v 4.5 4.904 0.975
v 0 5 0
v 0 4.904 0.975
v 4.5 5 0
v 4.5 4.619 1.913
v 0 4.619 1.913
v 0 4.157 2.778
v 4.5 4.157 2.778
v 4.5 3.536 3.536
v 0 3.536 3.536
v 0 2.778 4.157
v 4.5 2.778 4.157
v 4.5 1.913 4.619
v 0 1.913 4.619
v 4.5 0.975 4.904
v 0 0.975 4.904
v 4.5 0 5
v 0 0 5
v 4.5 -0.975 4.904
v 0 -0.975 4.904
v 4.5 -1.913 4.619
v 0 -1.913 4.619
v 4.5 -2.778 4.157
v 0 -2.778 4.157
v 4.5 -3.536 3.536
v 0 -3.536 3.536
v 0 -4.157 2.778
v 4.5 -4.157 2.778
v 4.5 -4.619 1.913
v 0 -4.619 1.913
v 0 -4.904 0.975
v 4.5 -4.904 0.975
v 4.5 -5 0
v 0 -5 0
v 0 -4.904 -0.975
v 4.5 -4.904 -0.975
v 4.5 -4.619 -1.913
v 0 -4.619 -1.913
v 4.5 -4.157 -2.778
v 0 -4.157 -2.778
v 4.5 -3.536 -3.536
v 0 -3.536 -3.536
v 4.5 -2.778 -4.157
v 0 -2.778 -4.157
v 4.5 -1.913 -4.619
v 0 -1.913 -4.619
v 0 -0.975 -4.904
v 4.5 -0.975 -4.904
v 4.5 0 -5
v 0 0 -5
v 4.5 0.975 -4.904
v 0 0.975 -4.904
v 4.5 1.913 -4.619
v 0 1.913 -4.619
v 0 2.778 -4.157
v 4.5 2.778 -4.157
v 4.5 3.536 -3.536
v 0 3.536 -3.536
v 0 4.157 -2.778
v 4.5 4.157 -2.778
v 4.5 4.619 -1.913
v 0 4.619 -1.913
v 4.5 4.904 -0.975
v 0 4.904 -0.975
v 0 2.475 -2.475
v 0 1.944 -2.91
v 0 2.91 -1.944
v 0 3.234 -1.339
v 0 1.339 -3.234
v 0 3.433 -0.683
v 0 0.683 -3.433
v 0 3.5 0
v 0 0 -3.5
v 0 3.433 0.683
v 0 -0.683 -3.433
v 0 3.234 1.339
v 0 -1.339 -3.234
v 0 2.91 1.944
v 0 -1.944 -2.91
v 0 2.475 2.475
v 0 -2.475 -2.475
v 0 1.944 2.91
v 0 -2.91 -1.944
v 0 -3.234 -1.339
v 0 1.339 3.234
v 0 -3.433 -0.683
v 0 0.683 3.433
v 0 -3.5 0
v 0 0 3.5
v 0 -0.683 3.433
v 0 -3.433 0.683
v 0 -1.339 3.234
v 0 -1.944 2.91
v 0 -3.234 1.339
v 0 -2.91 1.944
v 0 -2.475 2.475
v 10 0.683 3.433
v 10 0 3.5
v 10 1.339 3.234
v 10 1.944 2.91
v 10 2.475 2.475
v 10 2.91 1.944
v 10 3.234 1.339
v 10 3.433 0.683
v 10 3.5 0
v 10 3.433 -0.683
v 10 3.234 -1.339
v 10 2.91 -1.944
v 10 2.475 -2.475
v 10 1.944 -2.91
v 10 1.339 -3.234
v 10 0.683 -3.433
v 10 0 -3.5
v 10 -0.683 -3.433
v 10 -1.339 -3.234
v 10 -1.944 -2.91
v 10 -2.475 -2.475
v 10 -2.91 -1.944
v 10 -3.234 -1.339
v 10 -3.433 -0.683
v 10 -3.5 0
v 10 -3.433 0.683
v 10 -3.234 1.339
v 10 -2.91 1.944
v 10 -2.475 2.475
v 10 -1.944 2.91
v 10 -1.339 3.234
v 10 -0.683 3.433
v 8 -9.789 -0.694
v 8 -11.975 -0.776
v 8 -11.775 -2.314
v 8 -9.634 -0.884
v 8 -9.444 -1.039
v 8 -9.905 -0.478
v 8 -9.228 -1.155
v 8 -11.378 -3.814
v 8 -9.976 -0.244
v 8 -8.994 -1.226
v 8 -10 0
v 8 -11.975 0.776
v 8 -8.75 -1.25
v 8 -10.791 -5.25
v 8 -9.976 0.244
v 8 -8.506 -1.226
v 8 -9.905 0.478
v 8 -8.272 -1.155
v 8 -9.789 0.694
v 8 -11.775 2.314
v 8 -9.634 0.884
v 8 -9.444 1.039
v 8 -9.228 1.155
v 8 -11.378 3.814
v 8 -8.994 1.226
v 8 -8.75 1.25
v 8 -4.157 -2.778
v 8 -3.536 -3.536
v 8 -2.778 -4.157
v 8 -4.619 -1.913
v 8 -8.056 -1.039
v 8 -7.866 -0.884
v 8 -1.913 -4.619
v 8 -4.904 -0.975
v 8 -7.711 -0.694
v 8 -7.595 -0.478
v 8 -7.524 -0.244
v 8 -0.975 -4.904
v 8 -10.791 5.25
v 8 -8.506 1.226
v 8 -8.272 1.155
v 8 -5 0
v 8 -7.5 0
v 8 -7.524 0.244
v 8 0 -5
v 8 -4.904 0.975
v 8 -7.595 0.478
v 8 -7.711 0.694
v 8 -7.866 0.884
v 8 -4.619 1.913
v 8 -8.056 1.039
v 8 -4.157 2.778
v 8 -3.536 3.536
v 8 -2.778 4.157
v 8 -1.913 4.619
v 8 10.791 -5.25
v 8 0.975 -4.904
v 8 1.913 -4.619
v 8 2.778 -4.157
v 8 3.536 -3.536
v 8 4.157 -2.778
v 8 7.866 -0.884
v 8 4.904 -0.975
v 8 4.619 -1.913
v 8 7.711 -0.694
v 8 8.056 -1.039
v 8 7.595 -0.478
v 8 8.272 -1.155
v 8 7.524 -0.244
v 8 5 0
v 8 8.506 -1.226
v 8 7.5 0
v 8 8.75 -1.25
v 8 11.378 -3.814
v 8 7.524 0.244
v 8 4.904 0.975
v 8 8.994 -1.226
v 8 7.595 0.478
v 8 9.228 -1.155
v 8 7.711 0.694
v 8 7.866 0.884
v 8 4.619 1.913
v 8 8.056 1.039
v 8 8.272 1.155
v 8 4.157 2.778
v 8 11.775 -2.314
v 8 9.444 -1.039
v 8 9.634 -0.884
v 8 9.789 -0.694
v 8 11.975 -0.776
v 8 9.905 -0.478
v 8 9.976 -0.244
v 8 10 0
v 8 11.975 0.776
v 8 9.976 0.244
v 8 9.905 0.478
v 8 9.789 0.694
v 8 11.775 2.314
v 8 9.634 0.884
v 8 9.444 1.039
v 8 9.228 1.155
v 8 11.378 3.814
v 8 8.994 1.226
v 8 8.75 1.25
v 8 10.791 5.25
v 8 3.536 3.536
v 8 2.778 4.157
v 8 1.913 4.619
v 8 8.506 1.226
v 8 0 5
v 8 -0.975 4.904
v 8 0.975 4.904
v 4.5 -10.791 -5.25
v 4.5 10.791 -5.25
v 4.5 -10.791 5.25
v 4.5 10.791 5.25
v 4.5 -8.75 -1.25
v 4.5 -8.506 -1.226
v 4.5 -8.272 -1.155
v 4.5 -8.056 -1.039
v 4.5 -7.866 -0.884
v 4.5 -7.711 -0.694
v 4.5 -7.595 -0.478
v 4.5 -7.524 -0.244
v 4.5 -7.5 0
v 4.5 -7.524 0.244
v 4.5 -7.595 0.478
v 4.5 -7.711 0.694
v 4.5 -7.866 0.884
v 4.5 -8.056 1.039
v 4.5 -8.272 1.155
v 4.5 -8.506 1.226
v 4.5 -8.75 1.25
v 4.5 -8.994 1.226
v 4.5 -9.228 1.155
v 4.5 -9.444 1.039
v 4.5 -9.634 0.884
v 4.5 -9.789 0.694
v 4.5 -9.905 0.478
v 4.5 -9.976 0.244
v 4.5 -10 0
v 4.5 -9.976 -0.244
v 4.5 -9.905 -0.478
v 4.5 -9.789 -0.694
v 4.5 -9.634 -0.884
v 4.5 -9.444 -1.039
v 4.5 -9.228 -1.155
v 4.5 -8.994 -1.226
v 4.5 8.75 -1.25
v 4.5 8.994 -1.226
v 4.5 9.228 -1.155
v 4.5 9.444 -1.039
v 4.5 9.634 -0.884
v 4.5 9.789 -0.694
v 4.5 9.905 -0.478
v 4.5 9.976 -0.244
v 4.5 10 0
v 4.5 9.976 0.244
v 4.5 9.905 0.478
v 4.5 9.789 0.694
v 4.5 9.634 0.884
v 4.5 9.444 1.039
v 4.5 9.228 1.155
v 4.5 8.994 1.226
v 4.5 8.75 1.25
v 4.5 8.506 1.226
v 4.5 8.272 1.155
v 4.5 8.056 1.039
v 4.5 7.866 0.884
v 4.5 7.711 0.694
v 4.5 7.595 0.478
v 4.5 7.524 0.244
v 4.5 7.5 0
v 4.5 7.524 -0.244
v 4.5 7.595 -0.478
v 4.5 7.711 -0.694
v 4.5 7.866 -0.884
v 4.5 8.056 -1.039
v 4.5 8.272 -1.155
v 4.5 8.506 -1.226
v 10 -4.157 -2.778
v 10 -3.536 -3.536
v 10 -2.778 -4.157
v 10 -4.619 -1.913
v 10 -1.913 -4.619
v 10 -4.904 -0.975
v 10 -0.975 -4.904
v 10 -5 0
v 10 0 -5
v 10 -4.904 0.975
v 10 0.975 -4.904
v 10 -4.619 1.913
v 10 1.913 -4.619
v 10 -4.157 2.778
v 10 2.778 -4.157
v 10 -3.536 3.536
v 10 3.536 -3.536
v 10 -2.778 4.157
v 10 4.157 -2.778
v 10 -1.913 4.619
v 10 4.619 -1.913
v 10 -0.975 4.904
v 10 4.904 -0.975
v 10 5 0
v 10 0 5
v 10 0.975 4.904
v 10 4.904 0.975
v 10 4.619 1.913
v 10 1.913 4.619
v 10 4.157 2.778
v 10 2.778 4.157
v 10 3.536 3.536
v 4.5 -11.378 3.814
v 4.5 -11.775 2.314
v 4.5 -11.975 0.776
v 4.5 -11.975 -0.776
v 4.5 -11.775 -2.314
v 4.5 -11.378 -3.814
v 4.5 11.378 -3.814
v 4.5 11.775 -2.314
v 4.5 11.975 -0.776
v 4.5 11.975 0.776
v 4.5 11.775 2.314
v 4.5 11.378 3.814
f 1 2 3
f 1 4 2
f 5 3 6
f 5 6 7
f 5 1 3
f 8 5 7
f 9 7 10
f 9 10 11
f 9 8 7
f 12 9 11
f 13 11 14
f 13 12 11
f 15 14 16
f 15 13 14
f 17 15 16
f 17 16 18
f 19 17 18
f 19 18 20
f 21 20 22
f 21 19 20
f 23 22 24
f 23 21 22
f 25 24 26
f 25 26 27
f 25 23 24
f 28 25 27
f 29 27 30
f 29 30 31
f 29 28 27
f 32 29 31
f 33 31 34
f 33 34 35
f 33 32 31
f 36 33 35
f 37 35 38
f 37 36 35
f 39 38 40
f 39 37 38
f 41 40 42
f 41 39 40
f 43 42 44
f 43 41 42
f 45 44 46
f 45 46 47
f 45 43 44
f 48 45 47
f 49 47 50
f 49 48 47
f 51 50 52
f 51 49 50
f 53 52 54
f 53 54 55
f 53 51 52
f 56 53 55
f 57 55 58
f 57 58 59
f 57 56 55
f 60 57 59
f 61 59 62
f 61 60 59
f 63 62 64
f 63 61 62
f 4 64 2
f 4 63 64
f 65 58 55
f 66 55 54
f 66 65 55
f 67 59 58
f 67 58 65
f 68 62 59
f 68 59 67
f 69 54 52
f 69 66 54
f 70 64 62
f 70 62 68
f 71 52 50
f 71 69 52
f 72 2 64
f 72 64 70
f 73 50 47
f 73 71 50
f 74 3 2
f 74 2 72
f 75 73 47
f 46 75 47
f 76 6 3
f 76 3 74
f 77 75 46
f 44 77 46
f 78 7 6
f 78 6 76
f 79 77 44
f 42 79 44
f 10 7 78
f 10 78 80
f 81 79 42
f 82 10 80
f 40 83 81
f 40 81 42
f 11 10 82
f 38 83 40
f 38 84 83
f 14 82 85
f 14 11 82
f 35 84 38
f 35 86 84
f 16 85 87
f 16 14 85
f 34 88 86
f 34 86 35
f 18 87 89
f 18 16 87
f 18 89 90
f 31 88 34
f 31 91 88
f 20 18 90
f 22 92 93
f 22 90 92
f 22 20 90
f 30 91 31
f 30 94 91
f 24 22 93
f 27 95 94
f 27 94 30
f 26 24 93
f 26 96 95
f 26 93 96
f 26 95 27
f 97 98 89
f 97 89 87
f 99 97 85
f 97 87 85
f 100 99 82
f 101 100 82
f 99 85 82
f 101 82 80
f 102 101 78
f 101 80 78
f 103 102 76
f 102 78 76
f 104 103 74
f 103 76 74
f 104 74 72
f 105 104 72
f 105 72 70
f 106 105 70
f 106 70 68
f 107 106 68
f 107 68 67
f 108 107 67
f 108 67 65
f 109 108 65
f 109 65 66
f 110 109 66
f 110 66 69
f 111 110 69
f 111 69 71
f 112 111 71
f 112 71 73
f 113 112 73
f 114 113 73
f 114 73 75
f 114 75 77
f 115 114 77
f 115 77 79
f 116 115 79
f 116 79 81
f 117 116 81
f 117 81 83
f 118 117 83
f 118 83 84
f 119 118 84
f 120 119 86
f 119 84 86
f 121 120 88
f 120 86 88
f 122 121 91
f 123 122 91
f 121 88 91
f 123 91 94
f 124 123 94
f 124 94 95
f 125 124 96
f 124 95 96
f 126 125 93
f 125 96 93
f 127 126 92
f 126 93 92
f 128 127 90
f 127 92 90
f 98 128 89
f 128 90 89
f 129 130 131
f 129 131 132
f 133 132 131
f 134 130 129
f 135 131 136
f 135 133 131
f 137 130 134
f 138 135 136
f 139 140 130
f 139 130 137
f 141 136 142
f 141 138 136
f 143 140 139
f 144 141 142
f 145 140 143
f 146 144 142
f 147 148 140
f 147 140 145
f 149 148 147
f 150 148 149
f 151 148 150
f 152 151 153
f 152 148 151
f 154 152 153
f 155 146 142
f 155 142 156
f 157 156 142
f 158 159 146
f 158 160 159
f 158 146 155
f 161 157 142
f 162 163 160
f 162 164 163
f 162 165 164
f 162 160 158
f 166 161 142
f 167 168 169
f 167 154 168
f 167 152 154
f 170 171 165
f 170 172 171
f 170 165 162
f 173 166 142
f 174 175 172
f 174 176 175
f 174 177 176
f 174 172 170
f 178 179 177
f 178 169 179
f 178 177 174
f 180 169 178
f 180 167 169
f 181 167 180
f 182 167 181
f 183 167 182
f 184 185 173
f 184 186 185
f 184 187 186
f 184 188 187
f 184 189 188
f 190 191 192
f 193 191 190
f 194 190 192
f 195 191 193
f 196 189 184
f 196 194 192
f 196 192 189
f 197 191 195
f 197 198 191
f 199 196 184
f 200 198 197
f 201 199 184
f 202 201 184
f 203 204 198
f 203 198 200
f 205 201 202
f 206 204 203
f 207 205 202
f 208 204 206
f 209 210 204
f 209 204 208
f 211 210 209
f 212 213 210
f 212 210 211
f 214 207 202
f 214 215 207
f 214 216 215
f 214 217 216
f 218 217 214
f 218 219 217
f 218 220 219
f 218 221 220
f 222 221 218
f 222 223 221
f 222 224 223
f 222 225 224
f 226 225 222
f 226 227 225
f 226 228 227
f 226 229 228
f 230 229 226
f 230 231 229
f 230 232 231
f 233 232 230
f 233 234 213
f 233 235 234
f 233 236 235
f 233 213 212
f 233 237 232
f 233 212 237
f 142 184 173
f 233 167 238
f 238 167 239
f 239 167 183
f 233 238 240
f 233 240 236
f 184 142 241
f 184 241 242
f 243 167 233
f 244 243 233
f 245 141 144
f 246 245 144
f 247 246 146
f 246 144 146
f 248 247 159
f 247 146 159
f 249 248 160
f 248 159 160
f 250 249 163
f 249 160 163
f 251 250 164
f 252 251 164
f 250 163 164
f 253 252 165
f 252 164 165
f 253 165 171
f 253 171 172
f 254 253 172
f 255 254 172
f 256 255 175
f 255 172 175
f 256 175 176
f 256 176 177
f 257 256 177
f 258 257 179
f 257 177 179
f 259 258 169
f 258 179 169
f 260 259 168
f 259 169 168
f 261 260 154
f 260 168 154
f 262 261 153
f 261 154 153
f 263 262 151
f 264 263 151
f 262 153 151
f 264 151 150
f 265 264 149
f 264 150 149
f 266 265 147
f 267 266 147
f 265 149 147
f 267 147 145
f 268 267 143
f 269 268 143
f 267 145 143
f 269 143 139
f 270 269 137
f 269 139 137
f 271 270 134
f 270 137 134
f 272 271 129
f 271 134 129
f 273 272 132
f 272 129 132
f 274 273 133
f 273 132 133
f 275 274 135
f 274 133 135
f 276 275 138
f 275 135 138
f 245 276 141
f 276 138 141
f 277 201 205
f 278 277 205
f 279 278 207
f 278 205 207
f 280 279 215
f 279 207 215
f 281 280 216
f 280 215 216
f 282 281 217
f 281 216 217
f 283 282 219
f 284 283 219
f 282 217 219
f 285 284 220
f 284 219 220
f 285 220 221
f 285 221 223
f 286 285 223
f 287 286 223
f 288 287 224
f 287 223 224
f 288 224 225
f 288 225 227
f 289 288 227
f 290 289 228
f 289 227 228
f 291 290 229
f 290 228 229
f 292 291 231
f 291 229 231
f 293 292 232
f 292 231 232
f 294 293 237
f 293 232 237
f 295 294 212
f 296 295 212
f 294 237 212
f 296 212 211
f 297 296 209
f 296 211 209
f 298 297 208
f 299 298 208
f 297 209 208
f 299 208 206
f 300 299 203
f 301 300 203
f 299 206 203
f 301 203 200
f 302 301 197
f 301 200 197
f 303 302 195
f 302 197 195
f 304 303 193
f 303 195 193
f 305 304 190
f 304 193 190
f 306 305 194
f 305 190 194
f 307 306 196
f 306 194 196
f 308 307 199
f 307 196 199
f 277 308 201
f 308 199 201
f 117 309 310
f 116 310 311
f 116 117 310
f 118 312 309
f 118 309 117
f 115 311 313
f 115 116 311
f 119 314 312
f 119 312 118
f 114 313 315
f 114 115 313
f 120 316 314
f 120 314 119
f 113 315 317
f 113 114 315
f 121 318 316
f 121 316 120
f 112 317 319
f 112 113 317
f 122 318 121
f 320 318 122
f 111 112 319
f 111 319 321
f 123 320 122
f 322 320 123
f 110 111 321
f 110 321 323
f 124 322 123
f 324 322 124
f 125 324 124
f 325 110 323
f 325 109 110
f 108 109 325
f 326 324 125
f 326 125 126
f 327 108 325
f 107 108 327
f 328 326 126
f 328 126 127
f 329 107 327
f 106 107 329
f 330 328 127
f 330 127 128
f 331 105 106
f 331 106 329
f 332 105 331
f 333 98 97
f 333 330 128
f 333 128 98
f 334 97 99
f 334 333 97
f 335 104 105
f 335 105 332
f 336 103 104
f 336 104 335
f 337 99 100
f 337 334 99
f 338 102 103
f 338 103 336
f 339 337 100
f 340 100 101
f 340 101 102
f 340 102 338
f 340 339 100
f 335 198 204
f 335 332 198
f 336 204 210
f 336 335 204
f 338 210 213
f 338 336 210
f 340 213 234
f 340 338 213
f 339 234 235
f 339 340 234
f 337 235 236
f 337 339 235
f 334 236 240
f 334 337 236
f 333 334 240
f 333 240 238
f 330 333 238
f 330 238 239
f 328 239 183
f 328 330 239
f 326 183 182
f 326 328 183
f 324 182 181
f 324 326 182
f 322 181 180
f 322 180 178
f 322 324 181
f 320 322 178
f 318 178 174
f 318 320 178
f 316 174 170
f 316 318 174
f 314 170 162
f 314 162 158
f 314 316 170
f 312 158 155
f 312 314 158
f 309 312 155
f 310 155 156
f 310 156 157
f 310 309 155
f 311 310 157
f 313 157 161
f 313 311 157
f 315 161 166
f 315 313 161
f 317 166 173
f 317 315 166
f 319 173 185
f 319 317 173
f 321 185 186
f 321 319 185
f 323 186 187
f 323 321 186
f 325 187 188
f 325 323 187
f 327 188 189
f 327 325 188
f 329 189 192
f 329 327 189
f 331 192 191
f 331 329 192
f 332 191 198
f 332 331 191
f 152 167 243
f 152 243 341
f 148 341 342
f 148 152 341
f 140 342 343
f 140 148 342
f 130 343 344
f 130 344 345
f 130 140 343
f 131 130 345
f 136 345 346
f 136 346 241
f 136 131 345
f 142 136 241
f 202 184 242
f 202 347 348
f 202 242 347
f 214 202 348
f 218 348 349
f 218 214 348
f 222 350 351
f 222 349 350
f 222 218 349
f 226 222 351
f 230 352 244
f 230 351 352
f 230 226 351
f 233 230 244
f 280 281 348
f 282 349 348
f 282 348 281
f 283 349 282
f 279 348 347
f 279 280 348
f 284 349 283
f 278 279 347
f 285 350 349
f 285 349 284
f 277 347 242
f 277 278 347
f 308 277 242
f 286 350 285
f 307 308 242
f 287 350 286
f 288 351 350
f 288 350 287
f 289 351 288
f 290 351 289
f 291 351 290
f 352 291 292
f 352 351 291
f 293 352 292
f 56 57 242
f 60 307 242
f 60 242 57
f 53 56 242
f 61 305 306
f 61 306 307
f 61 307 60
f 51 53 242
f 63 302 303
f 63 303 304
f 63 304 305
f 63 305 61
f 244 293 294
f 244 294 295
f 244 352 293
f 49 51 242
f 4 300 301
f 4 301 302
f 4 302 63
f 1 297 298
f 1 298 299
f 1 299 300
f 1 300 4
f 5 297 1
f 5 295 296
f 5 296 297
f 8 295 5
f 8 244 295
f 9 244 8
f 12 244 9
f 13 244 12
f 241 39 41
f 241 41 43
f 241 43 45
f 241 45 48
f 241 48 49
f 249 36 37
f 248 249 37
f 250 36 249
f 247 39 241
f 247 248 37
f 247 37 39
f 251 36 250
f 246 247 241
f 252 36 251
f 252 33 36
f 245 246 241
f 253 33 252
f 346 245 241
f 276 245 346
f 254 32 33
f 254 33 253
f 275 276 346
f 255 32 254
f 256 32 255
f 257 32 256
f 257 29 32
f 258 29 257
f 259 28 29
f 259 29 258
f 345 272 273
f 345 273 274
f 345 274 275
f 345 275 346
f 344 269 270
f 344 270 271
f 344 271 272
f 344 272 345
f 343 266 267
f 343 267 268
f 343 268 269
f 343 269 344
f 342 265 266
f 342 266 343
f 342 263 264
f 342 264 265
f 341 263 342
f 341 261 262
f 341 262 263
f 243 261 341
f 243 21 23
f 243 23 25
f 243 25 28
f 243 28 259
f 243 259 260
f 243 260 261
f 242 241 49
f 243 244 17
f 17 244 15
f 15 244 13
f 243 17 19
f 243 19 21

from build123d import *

# Parameters (mm, degrees)
M8X1_0_TAPPED_HOLE1_D = 7
SKETCH6_R             = 1.25
SKETCH6_W             = 17.472275608
SKETCH6_H             = 29.884909838
SKETCH6_W_2           = 8.845933312
CUT_EXTRUDE1_DEPTH    = 3.5


with BuildPart() as part:
    # Sketch1 → Revolve1 (revolve)
    with BuildSketch(Plane.XY):
        Polygon((0, 0), (0, 5), (4.5, 5), (4.5, 12), (8, 12), (8, 5), (10, 5), (10, 0), align=None)
    revolve(axis=Axis((-27.226239534, 0, 0), (1, 0, 0)))

    # M8x1.0 Tapped Hole1 (through all)
    with Locations(Plane(origin=(10, 0, 0), x_dir=(0, 0, -1), z_dir=(1, 0, 0))):
        with Locations((0, 0)):
            Hole(M8X1_0_TAPPED_HOLE1_D / 2)

    # Sketch6 → Cut-Extrude1 (cut)
    with BuildSketch(Plane(origin=(8, 0, 0), x_dir=(0, 0, -1), z_dir=(1, 0, 0))):
        with Locations((0, 8.75)):
            Circle(SKETCH6_R)
        with Locations((0, -8.75)):
            Circle(SKETCH6_R)
        with Locations((13.986137804, 0)):
            Rectangle(SKETCH6_W, SKETCH6_H)
        with Locations((-9.672966656, 0)):
            Rectangle(SKETCH6_W_2, SKETCH6_H)
    extrude(amount=-CUT_EXTRUDE1_DEPTH, mode=Mode.SUBTRACT)


solid = part.part
